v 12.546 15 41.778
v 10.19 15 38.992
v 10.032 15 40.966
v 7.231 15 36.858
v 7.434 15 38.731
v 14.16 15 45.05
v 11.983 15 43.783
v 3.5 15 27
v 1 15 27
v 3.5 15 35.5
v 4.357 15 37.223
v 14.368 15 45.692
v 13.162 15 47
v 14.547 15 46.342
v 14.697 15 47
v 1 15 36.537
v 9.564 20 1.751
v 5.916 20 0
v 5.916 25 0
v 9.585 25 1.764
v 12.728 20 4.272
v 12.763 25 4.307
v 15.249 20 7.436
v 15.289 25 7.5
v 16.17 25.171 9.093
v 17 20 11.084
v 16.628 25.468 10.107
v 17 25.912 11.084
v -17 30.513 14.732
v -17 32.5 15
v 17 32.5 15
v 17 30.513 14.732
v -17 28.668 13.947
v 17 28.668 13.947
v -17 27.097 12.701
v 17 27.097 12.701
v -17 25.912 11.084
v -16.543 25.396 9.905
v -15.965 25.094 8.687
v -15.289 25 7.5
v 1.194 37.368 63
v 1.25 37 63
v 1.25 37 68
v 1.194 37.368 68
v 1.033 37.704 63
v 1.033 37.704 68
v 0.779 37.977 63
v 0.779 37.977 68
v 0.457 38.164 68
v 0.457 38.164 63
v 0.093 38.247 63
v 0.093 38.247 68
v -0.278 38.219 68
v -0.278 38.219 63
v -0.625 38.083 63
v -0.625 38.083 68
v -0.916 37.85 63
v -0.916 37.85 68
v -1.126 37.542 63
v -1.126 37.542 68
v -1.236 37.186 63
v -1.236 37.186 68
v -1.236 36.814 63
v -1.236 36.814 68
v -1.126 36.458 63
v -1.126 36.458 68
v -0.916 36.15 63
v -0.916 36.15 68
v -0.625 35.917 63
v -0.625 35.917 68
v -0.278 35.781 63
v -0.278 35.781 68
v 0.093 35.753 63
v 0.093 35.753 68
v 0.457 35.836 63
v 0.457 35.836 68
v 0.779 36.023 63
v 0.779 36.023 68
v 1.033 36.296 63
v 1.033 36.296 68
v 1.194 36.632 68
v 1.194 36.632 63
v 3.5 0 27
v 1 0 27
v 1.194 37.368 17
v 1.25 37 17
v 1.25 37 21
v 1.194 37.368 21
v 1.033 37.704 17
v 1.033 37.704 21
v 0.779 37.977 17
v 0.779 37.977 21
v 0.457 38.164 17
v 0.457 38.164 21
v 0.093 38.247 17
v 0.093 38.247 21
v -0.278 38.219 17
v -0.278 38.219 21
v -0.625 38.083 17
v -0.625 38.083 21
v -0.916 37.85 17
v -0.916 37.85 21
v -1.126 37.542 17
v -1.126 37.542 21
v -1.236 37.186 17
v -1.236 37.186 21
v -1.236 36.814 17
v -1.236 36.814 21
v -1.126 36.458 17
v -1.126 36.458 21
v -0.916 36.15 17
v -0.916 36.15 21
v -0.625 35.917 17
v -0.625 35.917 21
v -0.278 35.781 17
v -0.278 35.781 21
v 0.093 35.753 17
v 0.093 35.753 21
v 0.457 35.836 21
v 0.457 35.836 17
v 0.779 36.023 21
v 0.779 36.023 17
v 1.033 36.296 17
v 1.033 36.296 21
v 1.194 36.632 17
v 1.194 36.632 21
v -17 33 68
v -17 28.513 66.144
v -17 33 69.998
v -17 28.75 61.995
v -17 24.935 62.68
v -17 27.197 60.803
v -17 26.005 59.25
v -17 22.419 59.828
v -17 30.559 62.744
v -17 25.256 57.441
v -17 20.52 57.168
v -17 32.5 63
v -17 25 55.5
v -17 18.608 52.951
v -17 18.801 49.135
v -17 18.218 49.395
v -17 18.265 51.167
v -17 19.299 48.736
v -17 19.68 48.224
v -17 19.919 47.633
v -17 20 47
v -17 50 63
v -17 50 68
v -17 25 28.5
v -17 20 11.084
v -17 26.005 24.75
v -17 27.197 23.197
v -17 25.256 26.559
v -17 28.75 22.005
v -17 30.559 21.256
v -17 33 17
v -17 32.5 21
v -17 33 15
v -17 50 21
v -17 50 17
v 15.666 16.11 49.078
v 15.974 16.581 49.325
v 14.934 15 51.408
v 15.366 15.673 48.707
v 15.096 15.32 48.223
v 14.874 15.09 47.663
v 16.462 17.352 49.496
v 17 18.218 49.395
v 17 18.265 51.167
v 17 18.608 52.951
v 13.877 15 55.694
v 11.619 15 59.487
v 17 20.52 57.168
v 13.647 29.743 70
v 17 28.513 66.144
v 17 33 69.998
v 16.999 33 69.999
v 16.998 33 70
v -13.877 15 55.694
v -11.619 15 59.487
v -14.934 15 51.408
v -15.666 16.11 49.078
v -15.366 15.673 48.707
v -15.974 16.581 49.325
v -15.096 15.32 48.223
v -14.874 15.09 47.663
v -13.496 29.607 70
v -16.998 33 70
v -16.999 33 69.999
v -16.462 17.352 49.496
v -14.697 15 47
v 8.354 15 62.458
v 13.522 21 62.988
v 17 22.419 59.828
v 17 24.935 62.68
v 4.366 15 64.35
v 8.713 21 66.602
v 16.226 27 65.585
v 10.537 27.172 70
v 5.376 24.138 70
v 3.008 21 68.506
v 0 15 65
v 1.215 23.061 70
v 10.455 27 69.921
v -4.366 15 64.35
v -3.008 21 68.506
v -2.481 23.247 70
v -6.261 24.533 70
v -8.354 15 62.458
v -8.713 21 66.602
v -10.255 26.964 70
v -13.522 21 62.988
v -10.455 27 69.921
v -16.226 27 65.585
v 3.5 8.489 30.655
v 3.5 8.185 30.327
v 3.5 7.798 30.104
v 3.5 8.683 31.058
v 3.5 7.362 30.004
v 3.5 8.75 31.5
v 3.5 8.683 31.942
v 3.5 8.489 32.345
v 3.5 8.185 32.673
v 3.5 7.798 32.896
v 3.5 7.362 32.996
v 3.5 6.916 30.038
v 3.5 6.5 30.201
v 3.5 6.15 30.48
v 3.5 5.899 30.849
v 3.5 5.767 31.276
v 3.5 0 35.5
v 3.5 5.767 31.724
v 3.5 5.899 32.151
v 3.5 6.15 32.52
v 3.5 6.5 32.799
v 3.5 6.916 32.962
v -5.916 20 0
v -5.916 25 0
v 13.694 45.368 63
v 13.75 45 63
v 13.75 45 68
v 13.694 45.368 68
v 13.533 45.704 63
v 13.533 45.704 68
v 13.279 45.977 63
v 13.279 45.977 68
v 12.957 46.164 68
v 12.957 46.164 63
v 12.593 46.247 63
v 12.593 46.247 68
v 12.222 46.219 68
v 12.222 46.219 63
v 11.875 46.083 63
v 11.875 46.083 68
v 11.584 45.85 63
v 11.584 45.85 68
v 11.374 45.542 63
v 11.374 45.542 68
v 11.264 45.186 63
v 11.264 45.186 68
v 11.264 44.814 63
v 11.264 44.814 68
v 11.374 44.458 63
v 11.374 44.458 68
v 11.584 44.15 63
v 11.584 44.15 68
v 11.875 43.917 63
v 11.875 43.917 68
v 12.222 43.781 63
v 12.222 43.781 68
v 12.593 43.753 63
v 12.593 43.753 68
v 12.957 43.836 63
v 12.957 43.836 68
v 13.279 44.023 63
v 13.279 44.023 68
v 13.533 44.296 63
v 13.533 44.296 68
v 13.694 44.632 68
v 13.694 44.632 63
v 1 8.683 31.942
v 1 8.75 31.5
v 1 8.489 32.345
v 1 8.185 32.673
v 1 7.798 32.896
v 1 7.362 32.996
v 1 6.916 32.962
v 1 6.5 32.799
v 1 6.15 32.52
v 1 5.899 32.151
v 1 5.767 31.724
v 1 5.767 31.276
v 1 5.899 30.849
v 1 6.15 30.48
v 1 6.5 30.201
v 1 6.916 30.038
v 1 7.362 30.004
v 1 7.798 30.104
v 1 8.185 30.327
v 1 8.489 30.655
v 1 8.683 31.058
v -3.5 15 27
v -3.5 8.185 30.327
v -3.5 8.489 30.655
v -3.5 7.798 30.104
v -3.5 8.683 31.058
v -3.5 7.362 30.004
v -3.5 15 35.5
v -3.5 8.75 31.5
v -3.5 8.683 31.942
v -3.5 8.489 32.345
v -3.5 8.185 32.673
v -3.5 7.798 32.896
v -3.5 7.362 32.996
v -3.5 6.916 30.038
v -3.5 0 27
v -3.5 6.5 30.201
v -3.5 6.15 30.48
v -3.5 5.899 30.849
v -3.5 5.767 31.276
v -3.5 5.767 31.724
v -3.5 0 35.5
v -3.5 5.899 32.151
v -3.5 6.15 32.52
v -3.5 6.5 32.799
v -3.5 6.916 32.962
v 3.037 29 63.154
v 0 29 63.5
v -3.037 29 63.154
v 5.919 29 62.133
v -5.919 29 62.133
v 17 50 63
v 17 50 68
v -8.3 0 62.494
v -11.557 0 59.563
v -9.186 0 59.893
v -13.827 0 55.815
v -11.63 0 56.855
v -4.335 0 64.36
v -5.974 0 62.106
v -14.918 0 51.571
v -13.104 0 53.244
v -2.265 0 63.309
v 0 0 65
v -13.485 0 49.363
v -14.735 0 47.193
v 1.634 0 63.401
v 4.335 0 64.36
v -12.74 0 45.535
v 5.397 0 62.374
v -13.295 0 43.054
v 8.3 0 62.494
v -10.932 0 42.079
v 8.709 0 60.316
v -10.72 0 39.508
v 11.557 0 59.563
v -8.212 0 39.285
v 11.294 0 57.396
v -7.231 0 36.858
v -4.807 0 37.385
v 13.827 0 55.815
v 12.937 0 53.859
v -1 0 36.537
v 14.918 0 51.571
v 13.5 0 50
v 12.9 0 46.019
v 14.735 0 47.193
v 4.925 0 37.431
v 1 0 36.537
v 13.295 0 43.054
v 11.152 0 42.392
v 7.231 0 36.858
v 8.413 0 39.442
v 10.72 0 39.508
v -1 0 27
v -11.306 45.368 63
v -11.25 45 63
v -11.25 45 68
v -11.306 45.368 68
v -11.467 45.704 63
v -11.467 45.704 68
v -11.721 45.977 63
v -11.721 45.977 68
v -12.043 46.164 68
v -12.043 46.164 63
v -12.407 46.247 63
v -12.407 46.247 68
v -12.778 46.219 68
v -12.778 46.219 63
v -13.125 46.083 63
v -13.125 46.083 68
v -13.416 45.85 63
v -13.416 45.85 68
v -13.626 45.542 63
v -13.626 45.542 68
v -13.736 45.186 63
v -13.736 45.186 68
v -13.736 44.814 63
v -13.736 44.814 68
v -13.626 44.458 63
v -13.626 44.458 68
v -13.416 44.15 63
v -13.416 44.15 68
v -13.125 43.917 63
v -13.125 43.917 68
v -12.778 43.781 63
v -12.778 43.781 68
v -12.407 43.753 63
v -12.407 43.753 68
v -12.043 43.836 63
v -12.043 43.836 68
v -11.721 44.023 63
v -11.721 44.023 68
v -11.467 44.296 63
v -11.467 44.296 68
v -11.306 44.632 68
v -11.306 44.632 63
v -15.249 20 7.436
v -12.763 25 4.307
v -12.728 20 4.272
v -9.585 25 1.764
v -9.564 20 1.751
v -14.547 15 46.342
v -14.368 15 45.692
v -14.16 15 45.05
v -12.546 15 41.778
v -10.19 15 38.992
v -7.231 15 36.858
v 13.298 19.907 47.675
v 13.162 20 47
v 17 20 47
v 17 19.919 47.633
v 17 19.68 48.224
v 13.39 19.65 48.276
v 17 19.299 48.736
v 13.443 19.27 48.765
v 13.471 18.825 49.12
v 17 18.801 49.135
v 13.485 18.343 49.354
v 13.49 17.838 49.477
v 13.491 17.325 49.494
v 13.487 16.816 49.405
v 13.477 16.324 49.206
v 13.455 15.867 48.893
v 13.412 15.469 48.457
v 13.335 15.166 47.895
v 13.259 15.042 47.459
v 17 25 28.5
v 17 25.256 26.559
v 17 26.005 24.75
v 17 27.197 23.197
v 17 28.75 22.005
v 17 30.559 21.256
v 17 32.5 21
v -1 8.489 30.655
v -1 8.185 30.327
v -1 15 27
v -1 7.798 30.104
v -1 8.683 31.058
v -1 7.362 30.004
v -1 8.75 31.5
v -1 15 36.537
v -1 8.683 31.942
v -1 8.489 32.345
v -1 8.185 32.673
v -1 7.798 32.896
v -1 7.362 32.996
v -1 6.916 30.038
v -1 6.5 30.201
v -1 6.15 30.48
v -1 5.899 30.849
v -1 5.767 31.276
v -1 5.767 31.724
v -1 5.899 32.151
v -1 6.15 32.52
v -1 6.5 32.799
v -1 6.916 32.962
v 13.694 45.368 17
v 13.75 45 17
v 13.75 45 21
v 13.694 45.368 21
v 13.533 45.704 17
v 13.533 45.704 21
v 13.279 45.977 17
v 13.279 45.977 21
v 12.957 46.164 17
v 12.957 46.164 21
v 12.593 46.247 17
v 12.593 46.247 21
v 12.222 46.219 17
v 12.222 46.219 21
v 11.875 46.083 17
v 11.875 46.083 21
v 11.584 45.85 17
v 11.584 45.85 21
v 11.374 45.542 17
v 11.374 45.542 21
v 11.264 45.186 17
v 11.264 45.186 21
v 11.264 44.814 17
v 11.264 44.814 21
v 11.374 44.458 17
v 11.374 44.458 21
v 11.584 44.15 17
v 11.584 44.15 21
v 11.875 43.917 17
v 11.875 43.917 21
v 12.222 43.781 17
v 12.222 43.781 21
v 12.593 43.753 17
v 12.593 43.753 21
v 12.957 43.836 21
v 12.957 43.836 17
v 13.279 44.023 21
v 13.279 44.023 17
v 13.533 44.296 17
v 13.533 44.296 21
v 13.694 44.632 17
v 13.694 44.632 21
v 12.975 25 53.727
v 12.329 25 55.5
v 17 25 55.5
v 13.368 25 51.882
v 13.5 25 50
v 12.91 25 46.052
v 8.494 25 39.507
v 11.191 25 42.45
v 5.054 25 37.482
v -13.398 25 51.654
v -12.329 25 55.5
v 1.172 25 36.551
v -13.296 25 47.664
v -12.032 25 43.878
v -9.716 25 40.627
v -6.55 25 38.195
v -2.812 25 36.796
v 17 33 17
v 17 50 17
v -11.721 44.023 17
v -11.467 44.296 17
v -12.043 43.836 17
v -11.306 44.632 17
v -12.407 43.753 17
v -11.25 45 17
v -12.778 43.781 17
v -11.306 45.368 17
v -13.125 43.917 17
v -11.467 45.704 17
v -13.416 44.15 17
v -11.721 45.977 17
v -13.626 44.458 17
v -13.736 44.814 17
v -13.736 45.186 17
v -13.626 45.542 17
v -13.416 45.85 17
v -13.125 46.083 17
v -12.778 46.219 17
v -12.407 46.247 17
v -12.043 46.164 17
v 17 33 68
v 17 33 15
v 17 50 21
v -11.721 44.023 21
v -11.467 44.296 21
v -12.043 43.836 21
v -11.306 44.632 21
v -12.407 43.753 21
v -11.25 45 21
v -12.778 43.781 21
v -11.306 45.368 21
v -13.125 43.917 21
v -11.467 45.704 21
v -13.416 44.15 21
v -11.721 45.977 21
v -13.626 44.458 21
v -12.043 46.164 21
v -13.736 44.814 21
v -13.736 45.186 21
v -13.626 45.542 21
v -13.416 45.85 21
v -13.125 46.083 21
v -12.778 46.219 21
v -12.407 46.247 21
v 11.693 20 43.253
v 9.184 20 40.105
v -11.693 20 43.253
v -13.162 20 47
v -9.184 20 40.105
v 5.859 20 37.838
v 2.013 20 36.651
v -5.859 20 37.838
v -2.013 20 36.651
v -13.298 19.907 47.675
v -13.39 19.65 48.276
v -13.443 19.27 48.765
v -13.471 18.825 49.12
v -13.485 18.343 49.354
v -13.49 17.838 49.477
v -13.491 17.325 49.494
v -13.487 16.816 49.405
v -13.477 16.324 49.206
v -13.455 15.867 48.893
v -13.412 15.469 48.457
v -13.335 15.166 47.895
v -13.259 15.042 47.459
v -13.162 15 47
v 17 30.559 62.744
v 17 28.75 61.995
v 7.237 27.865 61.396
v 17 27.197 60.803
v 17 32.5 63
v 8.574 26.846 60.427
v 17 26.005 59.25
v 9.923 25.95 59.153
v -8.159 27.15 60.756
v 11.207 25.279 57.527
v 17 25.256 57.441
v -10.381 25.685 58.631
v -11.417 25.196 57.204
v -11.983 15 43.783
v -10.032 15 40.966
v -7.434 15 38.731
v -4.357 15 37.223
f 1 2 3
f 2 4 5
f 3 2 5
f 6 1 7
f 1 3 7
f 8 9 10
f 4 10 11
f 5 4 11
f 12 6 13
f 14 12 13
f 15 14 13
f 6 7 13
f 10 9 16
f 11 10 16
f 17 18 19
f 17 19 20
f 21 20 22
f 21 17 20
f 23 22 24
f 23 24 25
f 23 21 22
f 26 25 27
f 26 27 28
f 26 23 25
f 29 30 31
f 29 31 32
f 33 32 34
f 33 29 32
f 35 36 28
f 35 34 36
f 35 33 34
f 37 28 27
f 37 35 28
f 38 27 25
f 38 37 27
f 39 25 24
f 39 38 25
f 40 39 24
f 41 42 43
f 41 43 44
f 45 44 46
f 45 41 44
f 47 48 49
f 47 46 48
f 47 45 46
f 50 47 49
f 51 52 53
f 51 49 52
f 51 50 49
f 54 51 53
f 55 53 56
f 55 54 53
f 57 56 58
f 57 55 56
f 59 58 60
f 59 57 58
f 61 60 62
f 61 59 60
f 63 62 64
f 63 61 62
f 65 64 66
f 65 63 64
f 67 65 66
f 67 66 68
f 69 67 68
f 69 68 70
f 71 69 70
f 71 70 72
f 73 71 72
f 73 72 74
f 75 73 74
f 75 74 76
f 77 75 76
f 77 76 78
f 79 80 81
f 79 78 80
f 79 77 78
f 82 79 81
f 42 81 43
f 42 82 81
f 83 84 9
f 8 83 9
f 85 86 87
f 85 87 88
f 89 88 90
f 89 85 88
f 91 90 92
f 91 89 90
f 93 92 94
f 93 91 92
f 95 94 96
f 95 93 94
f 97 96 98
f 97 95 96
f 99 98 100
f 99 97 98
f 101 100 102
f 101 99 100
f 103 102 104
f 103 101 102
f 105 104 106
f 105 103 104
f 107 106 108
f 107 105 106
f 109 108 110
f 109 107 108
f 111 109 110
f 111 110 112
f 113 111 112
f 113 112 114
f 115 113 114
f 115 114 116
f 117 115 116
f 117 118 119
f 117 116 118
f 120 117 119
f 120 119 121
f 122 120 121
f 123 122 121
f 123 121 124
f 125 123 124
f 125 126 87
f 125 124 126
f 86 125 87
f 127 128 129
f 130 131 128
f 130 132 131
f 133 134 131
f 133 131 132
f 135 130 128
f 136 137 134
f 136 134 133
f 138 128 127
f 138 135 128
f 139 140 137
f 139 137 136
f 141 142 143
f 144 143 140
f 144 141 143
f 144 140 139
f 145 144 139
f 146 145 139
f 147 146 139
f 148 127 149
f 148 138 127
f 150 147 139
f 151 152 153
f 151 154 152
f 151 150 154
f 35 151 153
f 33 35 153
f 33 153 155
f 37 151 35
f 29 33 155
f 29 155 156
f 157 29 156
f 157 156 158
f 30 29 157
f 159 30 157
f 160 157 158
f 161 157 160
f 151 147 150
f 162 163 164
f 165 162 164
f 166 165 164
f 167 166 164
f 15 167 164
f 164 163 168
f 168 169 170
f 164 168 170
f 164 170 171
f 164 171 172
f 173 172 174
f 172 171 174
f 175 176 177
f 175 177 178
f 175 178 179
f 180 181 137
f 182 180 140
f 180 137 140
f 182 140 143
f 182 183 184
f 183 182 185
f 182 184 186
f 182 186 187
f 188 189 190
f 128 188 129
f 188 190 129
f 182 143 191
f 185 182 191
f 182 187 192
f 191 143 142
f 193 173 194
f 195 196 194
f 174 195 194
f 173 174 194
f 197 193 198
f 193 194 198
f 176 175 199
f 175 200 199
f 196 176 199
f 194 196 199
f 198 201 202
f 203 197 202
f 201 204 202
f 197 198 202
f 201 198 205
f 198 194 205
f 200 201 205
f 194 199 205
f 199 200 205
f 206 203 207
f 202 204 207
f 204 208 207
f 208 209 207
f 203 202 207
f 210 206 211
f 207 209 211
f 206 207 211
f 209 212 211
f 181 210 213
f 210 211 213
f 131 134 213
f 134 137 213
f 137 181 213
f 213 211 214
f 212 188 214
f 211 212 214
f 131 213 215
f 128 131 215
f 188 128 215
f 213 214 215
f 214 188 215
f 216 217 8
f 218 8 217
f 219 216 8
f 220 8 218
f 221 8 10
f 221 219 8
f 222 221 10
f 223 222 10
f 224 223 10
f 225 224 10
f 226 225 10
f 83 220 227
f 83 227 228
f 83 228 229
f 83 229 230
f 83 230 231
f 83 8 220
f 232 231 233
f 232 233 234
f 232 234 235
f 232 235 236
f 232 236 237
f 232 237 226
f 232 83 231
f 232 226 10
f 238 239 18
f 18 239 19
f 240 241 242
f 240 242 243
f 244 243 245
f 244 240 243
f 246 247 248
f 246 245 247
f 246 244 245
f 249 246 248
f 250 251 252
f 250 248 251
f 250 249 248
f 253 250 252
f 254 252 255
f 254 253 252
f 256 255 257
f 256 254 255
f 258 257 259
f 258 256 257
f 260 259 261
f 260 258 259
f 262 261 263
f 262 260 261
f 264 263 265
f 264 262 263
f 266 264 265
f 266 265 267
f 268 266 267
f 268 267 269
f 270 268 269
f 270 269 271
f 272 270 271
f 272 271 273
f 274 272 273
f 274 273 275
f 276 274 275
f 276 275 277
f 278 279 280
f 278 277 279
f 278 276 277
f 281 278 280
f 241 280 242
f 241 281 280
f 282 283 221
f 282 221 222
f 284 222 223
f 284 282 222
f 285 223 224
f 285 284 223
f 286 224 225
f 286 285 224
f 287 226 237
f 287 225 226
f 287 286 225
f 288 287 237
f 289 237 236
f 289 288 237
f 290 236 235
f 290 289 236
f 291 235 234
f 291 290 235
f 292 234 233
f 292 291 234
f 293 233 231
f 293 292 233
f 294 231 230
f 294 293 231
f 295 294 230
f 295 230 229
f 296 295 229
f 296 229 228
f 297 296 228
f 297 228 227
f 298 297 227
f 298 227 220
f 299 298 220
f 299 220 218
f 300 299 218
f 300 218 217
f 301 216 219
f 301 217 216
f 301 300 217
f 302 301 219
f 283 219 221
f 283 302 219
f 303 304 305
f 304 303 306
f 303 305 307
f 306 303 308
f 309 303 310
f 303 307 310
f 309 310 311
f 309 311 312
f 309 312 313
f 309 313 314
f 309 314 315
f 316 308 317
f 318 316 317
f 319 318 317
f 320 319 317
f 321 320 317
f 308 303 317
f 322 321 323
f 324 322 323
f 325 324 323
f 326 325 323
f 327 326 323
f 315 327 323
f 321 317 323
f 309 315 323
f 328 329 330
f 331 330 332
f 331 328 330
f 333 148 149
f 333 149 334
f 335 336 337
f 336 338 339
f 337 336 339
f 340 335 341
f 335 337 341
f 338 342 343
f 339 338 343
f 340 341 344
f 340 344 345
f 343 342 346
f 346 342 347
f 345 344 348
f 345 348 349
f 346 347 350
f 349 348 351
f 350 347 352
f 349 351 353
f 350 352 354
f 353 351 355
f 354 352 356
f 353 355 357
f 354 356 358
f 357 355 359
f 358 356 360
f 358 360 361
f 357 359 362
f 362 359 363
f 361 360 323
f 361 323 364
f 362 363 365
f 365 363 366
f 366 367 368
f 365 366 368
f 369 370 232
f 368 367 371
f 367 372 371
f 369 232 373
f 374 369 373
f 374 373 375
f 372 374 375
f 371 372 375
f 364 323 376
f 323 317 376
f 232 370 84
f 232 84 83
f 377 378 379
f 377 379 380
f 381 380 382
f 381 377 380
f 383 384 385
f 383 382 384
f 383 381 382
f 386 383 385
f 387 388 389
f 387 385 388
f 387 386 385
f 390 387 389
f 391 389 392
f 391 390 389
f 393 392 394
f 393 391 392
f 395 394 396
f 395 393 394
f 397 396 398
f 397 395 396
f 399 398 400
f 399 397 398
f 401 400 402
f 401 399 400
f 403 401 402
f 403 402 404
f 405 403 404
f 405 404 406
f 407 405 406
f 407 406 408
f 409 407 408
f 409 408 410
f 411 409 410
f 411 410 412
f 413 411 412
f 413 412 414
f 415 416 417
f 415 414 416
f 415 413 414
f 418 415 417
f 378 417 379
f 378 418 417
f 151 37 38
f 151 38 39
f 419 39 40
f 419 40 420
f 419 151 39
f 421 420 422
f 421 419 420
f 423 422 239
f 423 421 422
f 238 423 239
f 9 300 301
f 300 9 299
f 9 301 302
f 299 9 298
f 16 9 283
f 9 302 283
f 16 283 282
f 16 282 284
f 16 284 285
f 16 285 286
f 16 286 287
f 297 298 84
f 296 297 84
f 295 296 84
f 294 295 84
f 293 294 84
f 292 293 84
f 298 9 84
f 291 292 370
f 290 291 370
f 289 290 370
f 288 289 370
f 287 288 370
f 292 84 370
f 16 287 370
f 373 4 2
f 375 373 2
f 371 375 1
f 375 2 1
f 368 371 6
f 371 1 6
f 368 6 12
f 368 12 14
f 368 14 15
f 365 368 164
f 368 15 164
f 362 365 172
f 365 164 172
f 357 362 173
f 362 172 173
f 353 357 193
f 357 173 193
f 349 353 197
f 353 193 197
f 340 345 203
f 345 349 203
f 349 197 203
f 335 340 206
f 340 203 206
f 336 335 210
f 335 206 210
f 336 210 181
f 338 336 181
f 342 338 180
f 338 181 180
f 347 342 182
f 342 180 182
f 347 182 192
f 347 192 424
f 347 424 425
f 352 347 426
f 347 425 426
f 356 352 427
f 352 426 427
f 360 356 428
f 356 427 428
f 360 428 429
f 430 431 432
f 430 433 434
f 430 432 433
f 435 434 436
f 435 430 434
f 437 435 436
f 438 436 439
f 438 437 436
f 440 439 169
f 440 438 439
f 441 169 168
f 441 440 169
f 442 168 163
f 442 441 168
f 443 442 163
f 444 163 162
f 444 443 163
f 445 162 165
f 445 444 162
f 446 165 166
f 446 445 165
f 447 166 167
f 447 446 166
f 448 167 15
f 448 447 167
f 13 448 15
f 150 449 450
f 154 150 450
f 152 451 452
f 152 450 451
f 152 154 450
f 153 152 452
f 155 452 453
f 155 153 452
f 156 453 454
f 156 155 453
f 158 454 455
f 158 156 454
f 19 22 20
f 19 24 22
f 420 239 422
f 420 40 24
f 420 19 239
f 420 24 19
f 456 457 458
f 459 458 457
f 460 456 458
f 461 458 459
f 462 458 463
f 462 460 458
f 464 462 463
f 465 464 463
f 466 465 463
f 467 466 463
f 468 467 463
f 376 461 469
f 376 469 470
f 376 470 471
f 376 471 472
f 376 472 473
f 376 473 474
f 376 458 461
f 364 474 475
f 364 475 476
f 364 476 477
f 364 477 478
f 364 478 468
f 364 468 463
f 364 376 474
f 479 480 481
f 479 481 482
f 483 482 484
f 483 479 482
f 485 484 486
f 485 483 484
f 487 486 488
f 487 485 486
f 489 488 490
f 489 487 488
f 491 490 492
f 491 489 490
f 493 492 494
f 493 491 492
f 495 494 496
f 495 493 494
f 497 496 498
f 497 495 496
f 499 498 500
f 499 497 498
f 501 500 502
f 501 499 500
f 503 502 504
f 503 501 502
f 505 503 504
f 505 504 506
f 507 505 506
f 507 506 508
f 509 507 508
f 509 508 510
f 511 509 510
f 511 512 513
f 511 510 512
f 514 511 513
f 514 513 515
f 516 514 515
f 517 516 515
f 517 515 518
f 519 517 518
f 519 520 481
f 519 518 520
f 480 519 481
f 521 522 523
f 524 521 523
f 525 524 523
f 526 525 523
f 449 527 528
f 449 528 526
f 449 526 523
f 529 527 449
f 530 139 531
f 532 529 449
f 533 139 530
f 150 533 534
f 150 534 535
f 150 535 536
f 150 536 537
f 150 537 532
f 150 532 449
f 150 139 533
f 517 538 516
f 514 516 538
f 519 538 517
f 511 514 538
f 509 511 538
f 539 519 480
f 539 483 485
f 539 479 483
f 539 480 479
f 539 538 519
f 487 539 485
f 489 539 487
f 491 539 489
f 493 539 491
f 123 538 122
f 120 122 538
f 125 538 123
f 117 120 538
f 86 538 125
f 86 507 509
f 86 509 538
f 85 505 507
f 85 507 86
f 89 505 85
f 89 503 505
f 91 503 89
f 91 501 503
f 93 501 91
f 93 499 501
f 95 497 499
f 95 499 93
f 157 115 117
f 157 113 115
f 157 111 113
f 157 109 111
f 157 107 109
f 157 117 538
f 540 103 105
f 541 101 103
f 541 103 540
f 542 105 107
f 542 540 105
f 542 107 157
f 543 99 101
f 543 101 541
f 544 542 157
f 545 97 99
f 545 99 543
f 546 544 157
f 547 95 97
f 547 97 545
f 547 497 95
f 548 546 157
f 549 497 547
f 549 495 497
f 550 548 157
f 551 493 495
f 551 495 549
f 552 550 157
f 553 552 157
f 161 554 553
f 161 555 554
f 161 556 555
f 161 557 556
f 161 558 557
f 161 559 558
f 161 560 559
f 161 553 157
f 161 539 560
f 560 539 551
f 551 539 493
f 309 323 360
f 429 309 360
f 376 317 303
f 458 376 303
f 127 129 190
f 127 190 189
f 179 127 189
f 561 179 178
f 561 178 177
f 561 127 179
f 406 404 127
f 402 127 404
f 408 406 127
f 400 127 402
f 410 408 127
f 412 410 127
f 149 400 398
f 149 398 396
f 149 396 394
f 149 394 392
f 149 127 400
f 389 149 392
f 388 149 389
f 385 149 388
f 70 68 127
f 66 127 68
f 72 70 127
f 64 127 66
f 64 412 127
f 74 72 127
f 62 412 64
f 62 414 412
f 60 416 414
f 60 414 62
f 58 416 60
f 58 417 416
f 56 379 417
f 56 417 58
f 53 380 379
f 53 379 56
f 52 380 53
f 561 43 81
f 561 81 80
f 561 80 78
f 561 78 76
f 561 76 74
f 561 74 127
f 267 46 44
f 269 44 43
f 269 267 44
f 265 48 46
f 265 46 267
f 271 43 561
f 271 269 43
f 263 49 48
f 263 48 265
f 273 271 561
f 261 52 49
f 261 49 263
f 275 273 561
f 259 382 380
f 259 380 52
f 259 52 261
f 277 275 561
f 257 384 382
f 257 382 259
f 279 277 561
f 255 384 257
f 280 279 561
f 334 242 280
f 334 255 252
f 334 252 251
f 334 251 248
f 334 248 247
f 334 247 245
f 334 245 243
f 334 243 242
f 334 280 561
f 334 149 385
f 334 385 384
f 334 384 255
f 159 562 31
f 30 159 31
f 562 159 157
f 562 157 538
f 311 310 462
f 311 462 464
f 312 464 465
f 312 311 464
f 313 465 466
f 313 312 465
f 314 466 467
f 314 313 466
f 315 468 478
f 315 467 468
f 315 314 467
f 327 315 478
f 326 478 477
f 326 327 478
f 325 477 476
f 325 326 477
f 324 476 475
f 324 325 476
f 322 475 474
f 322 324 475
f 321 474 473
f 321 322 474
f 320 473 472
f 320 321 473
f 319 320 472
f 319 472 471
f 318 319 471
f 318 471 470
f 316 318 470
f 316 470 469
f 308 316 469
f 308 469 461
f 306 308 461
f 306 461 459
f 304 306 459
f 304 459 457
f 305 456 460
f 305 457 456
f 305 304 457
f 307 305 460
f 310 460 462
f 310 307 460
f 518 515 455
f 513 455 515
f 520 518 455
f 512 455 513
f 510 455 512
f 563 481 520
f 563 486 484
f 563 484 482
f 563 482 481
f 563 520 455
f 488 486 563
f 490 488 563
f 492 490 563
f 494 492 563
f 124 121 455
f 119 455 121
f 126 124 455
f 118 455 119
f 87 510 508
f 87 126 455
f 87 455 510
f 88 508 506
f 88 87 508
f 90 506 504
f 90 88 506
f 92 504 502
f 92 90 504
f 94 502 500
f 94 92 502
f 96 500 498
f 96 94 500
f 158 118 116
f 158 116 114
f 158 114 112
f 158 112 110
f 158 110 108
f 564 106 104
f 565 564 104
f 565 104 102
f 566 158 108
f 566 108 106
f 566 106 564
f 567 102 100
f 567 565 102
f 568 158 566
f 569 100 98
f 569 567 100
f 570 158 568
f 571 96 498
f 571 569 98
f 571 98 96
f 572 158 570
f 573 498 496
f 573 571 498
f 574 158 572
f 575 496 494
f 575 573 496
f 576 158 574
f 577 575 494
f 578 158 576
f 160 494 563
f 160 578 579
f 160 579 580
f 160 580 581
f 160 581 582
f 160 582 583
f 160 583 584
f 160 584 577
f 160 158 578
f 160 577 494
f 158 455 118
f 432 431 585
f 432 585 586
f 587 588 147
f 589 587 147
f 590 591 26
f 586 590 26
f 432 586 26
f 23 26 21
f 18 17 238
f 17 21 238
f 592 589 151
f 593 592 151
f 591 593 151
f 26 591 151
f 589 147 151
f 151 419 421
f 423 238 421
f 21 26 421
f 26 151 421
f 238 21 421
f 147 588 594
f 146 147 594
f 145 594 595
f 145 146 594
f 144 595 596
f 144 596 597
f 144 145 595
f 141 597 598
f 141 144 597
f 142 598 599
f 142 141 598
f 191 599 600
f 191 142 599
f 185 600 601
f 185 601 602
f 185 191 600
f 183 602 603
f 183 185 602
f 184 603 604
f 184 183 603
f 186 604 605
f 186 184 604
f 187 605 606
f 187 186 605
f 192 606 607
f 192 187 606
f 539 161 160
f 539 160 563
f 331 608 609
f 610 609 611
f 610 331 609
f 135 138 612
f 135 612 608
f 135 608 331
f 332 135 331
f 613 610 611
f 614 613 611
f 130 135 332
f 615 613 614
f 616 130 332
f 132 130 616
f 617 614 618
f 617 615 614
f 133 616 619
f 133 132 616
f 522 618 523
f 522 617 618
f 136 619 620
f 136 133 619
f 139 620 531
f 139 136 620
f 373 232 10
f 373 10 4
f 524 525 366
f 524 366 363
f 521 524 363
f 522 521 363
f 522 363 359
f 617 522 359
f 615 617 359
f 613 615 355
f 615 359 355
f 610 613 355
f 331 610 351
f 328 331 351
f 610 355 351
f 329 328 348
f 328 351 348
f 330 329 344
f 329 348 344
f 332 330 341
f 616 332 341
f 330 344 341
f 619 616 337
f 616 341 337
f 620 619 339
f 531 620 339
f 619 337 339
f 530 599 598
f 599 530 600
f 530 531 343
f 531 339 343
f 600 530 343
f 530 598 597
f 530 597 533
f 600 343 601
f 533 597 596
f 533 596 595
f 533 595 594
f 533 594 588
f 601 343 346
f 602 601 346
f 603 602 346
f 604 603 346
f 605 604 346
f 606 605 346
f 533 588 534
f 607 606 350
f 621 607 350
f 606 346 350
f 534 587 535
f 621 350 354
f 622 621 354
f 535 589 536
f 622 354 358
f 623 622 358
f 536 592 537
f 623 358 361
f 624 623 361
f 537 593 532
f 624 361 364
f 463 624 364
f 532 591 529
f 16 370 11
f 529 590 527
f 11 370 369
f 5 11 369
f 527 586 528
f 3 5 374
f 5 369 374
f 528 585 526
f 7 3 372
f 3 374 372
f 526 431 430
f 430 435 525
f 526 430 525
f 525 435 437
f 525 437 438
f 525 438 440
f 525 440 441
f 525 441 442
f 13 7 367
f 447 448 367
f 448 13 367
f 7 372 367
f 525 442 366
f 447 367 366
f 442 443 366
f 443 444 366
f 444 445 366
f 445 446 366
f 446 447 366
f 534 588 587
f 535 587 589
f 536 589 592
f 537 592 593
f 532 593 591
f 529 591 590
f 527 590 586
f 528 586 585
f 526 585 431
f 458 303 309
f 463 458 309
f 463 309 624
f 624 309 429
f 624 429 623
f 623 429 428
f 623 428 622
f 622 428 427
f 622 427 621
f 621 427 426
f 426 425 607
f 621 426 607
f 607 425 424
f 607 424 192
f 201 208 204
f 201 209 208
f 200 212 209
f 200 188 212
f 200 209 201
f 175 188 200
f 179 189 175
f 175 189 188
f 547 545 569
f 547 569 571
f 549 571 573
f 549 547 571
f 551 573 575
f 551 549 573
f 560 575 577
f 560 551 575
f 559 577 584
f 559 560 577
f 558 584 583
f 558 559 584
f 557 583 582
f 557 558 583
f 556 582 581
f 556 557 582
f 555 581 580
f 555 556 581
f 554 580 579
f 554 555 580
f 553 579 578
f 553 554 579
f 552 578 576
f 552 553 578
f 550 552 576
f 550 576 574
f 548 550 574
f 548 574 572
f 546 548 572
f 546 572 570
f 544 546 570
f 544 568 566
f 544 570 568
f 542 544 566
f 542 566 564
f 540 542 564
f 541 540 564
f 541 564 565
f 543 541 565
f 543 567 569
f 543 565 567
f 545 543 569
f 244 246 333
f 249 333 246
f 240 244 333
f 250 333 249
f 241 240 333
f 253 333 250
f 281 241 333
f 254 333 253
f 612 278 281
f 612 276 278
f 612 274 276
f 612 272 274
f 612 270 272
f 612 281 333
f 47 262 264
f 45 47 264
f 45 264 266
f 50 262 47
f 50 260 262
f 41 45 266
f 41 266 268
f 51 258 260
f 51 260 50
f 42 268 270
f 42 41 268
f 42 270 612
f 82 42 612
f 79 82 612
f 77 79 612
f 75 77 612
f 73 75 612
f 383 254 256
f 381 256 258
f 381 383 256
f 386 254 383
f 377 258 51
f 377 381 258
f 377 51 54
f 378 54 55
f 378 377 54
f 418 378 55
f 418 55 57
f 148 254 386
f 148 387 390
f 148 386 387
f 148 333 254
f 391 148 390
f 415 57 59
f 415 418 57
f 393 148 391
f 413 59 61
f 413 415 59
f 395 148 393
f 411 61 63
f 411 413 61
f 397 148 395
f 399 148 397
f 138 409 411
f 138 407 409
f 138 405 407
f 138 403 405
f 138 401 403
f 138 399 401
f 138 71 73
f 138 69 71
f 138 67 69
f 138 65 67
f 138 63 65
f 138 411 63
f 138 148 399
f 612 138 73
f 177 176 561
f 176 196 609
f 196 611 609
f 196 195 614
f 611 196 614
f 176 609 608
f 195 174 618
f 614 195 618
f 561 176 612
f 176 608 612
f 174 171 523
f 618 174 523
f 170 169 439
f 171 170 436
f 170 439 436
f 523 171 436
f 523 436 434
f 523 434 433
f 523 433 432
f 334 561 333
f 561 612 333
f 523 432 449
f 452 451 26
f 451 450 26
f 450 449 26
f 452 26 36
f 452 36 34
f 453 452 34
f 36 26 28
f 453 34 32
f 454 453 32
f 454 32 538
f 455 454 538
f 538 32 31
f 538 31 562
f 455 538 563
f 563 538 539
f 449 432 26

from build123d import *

# Parameters (mm, degrees)
SKETCH016_AS_DRAWN_R                 = 13.5
EXTRUDE001_DEPTH                     = 30
EXTRUDE001_ONTO_SKETCH016_ROLL_ANGLE = 90
SKETCH017_AS_DRAWN_W                 = 2
SKETCH017_AS_DRAWN_H                 = 25
EXTRUDE002_DEPTH                     = 20
EXTRUDE002_ONTO_SKETCH017_ROLL_ANGLE = 90
SKETCH020_W                          = 40
SKETCH020_H                          = 28
EXTRUDE003_DEPTH                     = 3
EXTRUDE004_DEPTH                     = 3
SKETCH021_R                          = 1.25
EXTRUDE005_DEPTH                     = 15
EXTRUDE006_DEPTH                     = 15
SKETCH023_W                          = 45
SKETCH023_H                          = 10
SKETCH_R                             = 1.5
EXTRUDE_DEPTH                        = 38
SKETCH014_W                          = 16
SKETCH014_H                          = 20
BOX_W                                = 34
BOX_H                                = 50
BOX_DEPTH                            = 70


with BuildPart() as extrude_tube_hole:
    # Sketch016 as drawn → Extrude001 (new)
    with BuildSketch(Plane.XY):
        with Locations((0, 50)):
            Circle(SKETCH016_AS_DRAWN_R)
    extrude(amount=-EXTRUDE001_DEPTH)


with BuildPart() as extrude_tube_hole_1:
    # Extrude001 onto Sketch016 roll: moved
    add(extrude_tube_hole.part.rotate(Axis((0, 0, 0), (1, 0, 0)), EXTRUDE001_ONTO_SKETCH016_ROLL_ANGLE))


with BuildPart() as extrude_tube_hole_2:
    # Extrude001 onto Sketch016 placement: moved
    add(extrude_tube_hole_1.part)


with BuildPart() as extrude_tube_hole_3:
    # Extrude001 placement: moved
    add(extrude_tube_hole_2.part.moved(Location((0, -1, 0))))


with BuildPart() as arc_ext:
    # Sketch017 as drawn → Extrude002 (new)
    with BuildSketch(Plane.XY):
        Polygon((3.5, 35.5), (20, 41.505509), (20, 20), (3.5, 20), align=None)
        Polygon((-3.5, 35.5), (-20, 41.505509), (-20, 20), (-3.5, 20), align=None)
        with Locations((0, 27.5)):
            Rectangle(SKETCH017_AS_DRAWN_W, SKETCH017_AS_DRAWN_H)
    extrude(amount=-EXTRUDE002_DEPTH)


with BuildPart() as arc_ext_1:
    # Extrude002 onto Sketch017 roll: moved
    add(arc_ext.part.rotate(Axis((0, 0, 0), (1, 0, 0)), EXTRUDE002_ONTO_SKETCH017_ROLL_ANGLE))


with BuildPart() as arc_ext_2:
    # Extrude002 onto Sketch017 placement: moved
    add(arc_ext_1.part)


with BuildPart() as arc_ext_3:
    # Extrude002 placement: moved
    add(arc_ext_2.part.moved(Location((0, -1, 0))))


with BuildPart() as extrude003:
    # Sketch020 → Extrude003 (new body)
    with BuildSketch(Plane.XY):
        with Locations((0, 47)):
            Rectangle(SKETCH020_W, SKETCH020_H)
    extrude(amount=EXTRUDE003_DEPTH)


with BuildPart() as extrude003_1:
    # Extrude003 placement: moved
    add(extrude003.part.moved(Location((0, 0, 68))))


with BuildPart() as extrude004:
    # Sketch020 → Extrude004 (new body)
    with BuildSketch(Plane.XY):
        with Locations((0, 47)):
            Rectangle(SKETCH020_W, SKETCH020_H)
    extrude(amount=EXTRUDE004_DEPTH)


with BuildPart() as extrude004_1:
    # Extrude004 placement: moved
    add(extrude004.part.moved(Location((0, 0, 14))))


with BuildPart() as extrude005:
    # Sketch021 → Extrude005 (new body)
    with BuildSketch(Plane.XY):
        with Locations((-12.5, 45)):
            Circle(SKETCH021_R)
        with Locations((12.5, 45)):
            Circle(SKETCH021_R)
        with Locations((0, 37)):
            Circle(SKETCH021_R)
    extrude(amount=EXTRUDE005_DEPTH)


with BuildPart() as extrude005_1:
    # Extrude005 placement: moved
    add(extrude005.part.moved(Location((0, 0, 13))))


with BuildPart() as extrude006:
    # Sketch021 → Extrude006 (new body)
    with BuildSketch(Plane.XY):
        with Locations((-12.5, 45)):
            Circle(SKETCH021_R)
        with Locations((12.5, 45)):
            Circle(SKETCH021_R)
        with Locations((0, 37)):
            Circle(SKETCH021_R)
    extrude(amount=EXTRUDE006_DEPTH)


with BuildPart() as extrude006_1:
    # Extrude006 placement: moved
    add(extrude006.part.moved(Location((0, 0, 58))))


with BuildPart() as sweep002:
    # Sweep002: sweep along a path in Sketch022
    with BuildLine(Plane.XZ) as sweep002_path:
        ThreePointArc((-18, 17), (0, -1), (18, 17))
    # Sketch023 → Sweep002 (sweep)
    with BuildSketch(Plane.YZ):
        with Locations((21.5, -6)):
            Rectangle(SKETCH023_W, SKETCH023_H)
    sweep(path=sweep002_path.line)


with BuildPart() as fusion001:
    # Sketch → Extrude (new body)
    with BuildSketch(Plane.YZ):
        with Locations((7.25, 31.5)):
            Circle(SKETCH_R)
        with BuildLine():
            Line((61, 63), (32.5, 63))
            ThreePointArc((32.5, 63), (27.196699, 60.803301), (25, 55.5))
            Line((25, 55.5), (25, 28.5))
            ThreePointArc((25, 28.5), (27.196699, 23.196699), (32.5, 21))
            Line((32.5, 21), (61, 21))
            Line((61, 21), (61, 63))
        make_face()
        with BuildLine():
            Line((61, 15), (32.5, 15))
            ThreePointArc((32.5, 15), (27.196699, 12.803301), (25, 7.5))
            Line((25, 7.5), (25, -2))
            Line((25, -2), (61, -2))
            Line((61, -2), (61, 15))
        make_face()
        with BuildLine():
            Line((20, 47), (20, -2))
            Line((20, -2), (-0.5, -2))
            Line((-0.5, -2), (-0.5, 27))
            Line((-0.5, 27), (15, 27))
            Line((15, 27), (15, 47))
            ThreePointArc((20, 47), (17.5, 49.5), (15, 47))
        make_face()
    extrude(amount=EXTRUDE_DEPTH)


with BuildPart() as fusion001_1:
    # Extrude placement: moved
    add(fusion001.part.moved(Location((-19, 0, 0))))

    # Fusion001: union Extrude-tube-hole, arc-ext, Extrude003, Extrude004, Extrude005, Extrude006, Sweep002
    add(extrude_tube_hole_3.part)
    add(arc_ext_3.part)
    add(extrude003_1.part)
    add(extrude004_1.part)
    add(extrude005_1.part)
    add(extrude006_1.part)
    add(sweep002.part)


with BuildPart() as sweep_body:
    # Sweep: sweep along a path in Sketch015
    with BuildLine(Plane.XZ) as sweep_path:
        ThreePointArc((4, 40.834849), (0, 60), (-4, 40.834849))
    # Sketch014 → Sweep (sweep)
    with BuildSketch(Plane(origin=(0, -1, 0), x_dir=(0, 1, 0), z_dir=(1, 0, 0))):
        with Locations((8, 75)):
            Rectangle(SKETCH014_W, SKETCH014_H)
    sweep(path=sweep_path.line)


with BuildPart() as fusion:
    # Sweep001: sweep along a path in Sketch019
    with BuildLine(Plane.XZ) as sweep001_path:
        ThreePointArc((9.439809, 46.7), (0, 60), (-9.439809, 46.7))
    # Sketch018 → Sweep001 (sweep)
    with BuildSketch(Plane(origin=(0, -1, 0), x_dir=(0, 1, 0), z_dir=(1, 0, 0))):
        Polygon((16, 65), (16, 83.121211), (45, 83.121211), align=None)
    sweep(path=sweep001_path.line)

    # Fusion: union Sweep body
    add(sweep_body.part)


with BuildPart() as cut001:
    # Box → Box (new body)
    with BuildSketch(Plane(origin=(-17, 0, 0), x_dir=(1, 0, 0), z_dir=(0, 0, 1))):
        with Locations((17, 25)):
            Rectangle(BOX_W, BOX_H)
    extrude(amount=BOX_DEPTH)

    # Cut: cut Fusion
    add(fusion.part, mode=Mode.SUBTRACT)

    # Cut001: cut Fusion001
    add(fusion001_1.part, mode=Mode.SUBTRACT)


solid = cut001.part
